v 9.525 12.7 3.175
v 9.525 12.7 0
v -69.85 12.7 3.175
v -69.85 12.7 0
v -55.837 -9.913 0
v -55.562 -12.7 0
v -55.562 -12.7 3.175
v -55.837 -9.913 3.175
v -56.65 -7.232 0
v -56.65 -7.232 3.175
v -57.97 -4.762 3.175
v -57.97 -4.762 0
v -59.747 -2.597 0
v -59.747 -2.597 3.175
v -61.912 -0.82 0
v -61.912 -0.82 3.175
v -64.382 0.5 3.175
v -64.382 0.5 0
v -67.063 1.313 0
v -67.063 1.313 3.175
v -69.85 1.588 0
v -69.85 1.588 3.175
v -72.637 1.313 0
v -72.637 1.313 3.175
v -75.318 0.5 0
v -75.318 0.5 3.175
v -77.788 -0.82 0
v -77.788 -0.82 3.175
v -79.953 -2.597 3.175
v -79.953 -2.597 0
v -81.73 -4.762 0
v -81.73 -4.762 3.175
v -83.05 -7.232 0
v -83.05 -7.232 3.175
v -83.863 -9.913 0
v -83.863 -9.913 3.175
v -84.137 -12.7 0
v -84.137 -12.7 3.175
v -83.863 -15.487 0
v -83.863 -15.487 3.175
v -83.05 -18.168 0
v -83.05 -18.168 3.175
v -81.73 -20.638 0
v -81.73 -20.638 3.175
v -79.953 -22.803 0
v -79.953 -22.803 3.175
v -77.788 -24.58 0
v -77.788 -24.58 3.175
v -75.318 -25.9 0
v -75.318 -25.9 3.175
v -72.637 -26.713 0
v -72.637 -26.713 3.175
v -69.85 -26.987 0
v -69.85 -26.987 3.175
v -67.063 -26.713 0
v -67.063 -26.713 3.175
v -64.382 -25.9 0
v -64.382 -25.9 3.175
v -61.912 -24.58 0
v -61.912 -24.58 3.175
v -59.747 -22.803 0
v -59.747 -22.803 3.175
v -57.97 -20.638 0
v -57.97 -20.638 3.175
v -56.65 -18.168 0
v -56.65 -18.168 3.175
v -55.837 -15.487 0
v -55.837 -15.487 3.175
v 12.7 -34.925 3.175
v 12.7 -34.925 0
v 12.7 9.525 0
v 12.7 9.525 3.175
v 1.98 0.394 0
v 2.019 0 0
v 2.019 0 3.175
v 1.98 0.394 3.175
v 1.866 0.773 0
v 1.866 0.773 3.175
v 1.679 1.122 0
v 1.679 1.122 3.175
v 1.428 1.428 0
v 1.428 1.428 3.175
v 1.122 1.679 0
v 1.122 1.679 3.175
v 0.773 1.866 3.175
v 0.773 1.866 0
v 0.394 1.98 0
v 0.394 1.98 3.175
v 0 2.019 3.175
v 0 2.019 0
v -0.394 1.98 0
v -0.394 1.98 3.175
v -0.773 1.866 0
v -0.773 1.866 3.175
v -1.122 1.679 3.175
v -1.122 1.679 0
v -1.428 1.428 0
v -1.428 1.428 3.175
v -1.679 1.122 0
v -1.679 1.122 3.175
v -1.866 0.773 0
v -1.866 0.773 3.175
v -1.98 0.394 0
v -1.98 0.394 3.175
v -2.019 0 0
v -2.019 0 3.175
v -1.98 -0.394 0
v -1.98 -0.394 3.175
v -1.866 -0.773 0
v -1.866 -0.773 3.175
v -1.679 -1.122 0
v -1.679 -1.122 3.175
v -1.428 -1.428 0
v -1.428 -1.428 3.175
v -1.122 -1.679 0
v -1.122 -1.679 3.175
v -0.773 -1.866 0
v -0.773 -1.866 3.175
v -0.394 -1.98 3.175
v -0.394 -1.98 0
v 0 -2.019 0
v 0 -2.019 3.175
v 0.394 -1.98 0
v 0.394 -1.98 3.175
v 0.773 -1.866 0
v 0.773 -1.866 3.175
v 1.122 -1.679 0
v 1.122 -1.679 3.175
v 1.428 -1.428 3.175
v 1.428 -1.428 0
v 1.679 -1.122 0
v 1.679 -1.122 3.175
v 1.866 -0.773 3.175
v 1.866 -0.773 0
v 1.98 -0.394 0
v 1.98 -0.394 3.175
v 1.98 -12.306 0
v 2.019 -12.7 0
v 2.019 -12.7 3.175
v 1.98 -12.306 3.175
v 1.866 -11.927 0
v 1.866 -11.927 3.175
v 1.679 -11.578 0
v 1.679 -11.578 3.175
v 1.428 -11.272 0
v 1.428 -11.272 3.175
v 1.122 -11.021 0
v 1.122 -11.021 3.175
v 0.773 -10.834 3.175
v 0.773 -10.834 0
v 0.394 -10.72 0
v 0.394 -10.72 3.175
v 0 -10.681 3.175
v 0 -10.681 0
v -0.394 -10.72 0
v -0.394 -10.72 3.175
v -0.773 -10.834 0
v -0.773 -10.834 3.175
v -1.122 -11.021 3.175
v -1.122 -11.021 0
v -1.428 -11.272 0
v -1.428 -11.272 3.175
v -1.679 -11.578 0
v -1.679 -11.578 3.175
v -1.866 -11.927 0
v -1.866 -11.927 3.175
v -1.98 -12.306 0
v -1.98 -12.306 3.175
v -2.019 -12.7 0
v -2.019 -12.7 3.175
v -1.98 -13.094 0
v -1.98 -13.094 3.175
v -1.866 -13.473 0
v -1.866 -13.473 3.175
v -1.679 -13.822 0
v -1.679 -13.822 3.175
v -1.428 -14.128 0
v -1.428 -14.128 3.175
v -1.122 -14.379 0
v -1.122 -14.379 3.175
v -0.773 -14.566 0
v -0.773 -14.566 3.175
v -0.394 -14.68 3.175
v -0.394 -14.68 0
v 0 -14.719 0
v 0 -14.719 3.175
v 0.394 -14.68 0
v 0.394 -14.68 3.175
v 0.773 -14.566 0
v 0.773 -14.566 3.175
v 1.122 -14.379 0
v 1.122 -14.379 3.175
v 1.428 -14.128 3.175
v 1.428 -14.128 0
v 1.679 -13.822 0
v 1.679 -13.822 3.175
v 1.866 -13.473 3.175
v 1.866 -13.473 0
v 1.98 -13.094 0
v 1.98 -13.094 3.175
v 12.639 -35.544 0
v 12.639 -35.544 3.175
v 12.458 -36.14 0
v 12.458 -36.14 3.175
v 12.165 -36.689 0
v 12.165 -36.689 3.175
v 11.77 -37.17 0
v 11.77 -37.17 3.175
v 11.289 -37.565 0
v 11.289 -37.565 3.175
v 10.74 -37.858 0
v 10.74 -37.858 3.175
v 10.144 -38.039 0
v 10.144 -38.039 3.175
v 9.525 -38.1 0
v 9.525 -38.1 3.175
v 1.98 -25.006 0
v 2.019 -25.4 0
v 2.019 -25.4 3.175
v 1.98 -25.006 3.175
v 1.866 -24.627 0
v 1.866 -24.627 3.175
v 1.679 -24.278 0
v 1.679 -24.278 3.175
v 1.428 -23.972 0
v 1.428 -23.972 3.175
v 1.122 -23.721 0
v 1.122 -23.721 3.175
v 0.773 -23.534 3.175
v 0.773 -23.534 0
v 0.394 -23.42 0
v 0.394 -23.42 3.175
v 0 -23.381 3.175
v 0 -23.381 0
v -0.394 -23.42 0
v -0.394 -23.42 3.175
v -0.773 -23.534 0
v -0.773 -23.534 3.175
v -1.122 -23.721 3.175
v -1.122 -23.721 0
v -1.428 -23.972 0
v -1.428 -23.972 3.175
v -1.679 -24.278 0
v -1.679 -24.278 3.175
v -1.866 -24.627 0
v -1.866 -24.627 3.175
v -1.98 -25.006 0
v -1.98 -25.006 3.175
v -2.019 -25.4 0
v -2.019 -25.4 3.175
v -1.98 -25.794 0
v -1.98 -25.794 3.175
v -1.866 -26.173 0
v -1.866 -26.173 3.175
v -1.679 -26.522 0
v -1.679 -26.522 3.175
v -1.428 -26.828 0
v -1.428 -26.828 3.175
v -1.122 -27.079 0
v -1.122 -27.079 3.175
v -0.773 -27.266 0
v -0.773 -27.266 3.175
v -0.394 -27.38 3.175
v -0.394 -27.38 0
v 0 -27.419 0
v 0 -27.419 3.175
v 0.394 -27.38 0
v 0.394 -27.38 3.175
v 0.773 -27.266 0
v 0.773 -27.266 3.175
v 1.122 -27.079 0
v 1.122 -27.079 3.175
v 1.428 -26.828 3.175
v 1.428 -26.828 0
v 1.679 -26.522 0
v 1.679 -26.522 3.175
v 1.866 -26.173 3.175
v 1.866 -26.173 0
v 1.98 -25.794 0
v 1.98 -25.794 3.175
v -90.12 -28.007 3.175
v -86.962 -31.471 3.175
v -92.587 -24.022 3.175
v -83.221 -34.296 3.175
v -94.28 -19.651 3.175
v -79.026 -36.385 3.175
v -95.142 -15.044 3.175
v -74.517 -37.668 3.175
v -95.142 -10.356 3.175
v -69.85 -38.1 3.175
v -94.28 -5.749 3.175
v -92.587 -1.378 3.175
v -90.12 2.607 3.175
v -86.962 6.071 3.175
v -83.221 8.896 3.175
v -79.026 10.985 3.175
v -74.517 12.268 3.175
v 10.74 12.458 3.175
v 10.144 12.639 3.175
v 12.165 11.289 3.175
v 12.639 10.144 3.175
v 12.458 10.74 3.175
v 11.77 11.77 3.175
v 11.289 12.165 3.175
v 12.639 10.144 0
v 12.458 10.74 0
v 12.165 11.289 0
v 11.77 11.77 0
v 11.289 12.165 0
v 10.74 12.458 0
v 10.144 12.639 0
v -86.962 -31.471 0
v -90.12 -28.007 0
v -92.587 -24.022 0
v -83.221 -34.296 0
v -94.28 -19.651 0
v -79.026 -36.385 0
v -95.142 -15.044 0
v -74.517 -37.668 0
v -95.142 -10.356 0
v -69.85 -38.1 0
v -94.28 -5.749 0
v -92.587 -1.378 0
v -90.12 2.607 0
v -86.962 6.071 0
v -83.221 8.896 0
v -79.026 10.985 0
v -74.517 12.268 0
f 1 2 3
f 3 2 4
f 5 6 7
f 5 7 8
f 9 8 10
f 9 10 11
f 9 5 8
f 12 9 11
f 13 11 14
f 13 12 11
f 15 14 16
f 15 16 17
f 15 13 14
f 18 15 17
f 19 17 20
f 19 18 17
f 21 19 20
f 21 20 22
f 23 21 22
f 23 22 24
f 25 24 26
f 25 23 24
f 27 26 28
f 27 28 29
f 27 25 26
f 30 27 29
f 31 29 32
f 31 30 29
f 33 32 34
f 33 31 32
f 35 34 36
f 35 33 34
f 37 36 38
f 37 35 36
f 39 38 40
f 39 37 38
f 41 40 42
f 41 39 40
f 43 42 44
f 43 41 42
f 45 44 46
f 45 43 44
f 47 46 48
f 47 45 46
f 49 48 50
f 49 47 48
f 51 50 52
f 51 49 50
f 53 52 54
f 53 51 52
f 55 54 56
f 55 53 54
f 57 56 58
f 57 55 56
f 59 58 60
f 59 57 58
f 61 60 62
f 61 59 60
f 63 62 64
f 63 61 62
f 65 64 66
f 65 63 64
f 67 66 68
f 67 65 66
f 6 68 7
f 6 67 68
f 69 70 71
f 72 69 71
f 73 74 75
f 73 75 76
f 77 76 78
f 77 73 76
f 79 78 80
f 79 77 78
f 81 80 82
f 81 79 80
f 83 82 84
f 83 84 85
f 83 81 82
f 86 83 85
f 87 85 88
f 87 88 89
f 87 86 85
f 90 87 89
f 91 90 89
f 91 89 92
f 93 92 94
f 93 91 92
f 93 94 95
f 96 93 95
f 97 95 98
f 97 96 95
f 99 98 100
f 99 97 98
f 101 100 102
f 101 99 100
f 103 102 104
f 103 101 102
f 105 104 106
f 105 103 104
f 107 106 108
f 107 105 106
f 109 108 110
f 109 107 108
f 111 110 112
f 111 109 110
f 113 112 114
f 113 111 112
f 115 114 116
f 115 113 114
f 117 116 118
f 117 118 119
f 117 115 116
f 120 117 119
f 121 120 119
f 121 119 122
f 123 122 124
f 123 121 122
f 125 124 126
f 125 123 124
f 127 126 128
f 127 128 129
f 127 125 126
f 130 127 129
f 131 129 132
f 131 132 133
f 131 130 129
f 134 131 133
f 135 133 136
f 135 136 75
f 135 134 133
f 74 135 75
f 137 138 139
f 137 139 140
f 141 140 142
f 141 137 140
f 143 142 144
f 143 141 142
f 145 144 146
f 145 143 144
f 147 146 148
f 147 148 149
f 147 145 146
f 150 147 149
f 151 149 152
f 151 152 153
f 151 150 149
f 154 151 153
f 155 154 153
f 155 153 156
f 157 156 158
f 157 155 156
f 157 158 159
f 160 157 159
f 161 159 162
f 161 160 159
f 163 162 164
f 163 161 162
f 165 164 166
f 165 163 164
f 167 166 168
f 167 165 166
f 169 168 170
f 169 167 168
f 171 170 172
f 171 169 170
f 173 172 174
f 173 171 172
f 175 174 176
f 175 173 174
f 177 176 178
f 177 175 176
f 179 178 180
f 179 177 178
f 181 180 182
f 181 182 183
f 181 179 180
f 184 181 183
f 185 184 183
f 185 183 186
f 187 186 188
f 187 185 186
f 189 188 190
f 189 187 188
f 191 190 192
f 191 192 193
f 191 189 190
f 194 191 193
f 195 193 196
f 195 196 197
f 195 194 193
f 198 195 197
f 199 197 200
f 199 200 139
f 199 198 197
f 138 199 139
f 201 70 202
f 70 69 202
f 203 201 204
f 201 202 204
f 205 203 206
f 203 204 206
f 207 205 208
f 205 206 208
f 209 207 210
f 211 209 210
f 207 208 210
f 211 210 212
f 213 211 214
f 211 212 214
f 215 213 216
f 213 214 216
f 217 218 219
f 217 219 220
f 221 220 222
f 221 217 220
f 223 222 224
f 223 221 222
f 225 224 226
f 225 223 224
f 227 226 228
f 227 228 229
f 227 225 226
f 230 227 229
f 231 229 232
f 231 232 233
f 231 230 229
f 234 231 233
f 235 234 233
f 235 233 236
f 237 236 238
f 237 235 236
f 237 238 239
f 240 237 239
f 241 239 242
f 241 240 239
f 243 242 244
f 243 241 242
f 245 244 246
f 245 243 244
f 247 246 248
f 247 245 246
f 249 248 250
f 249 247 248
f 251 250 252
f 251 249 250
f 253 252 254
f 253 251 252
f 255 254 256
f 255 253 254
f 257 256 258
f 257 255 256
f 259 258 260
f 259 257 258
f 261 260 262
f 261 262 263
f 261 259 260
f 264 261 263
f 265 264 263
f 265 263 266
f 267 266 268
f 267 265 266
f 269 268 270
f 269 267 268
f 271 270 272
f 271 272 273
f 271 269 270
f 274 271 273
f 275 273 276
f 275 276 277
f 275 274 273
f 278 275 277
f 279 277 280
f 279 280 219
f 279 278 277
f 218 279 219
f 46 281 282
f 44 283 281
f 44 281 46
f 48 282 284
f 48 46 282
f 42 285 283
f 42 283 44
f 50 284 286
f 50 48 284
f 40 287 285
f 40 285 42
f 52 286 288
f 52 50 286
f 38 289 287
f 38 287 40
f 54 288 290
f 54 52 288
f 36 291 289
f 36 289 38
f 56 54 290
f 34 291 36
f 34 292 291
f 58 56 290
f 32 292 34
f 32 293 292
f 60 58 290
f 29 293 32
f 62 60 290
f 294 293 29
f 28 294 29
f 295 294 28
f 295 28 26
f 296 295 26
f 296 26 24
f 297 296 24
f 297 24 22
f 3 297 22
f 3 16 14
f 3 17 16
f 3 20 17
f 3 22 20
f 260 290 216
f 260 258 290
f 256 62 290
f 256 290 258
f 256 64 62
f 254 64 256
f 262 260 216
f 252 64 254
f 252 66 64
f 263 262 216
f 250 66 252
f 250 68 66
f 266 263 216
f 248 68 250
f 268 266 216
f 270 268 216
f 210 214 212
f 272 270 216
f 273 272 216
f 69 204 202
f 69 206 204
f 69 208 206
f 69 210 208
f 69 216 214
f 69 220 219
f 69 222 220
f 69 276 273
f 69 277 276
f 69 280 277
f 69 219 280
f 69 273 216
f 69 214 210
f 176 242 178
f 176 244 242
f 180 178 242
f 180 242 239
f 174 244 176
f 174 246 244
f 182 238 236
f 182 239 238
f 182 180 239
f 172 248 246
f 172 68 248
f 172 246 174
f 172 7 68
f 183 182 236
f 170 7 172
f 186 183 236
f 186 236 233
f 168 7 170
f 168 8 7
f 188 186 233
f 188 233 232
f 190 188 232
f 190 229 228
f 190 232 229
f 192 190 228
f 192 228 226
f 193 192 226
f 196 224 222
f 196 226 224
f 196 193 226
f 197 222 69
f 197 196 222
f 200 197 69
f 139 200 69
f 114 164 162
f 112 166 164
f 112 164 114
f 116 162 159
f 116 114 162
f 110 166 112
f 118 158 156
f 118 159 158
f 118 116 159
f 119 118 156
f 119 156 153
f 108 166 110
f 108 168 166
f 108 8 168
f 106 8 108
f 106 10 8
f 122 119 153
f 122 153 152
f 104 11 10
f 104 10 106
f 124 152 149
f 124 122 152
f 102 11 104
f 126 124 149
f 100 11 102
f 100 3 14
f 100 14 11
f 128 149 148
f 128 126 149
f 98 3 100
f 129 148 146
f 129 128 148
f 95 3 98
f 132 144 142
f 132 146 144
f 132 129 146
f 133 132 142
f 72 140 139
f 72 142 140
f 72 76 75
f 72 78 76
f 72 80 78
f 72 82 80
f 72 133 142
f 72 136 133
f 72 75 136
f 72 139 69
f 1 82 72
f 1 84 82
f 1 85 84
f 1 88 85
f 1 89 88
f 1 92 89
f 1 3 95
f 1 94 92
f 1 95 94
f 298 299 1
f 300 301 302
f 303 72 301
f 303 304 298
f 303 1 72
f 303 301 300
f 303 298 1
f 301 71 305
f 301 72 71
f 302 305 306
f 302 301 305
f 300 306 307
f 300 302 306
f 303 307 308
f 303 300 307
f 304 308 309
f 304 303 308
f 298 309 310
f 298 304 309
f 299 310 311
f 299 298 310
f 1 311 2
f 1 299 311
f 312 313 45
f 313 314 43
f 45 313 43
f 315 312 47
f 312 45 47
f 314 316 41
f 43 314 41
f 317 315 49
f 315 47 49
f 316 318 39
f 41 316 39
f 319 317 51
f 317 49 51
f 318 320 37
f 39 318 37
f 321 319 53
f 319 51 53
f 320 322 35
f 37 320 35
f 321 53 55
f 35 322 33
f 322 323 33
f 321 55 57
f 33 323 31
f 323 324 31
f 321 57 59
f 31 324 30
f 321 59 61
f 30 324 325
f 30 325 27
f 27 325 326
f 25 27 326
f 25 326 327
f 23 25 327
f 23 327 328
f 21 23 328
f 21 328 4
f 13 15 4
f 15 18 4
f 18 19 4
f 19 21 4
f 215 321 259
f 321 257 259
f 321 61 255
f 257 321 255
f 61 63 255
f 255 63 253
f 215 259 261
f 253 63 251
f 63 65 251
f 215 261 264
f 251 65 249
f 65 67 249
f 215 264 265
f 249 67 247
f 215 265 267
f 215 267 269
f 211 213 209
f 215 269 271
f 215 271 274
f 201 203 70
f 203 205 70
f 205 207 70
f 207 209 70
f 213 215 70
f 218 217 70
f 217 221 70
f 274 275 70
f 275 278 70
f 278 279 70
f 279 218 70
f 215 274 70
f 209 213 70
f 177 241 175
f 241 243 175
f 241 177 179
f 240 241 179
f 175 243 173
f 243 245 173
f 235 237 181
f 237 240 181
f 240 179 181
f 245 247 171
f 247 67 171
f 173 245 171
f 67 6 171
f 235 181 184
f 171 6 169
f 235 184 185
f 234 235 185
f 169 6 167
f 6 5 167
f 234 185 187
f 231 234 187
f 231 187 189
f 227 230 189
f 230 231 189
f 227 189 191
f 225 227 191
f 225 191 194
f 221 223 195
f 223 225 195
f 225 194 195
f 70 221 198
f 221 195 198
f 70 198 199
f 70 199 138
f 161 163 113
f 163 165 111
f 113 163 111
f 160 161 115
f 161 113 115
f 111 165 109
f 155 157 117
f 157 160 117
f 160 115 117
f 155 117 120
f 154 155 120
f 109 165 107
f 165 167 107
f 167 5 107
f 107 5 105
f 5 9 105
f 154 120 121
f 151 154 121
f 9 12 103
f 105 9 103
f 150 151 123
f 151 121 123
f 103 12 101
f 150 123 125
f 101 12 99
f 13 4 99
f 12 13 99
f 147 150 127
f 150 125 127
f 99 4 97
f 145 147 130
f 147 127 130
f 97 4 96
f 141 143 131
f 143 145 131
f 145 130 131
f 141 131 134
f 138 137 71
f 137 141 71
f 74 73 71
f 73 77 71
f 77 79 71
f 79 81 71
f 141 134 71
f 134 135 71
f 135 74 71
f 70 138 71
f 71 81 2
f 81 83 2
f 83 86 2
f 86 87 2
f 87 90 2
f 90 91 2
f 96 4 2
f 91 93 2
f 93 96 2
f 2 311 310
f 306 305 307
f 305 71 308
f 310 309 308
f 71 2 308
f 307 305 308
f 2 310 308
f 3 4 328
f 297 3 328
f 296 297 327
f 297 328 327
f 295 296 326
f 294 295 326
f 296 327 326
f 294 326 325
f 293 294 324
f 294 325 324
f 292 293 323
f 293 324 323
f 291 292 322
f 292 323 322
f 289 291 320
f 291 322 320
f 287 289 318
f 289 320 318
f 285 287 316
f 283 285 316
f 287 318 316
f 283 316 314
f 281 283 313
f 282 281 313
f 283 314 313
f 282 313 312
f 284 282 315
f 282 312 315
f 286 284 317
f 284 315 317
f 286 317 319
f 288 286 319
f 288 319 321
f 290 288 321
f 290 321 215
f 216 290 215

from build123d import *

# Parameters (mm, degrees)
SKETCH1_R           = 2.0193
SKETCH1_R_2         = 14.2875
BOSS_EXTRUDE1_DEPTH = 3.175
FILLET1_R           = 3.175


with BuildPart() as part:
    # Sketch1 → Boss-Extrude1 (new body)
    with BuildSketch(Plane.XY):
        with BuildLine():
            Line((12.7, -38.1), (12.7, 12.7))
            Line((12.7, 12.7), (-69.85, 12.7))
            ThreePointArc((-69.85, 12.7), (-95.25, -12.7), (-69.85, -38.1))
            Line((-69.85, -38.1), (12.7, -38.1))
        make_face()
        Circle(SKETCH1_R, mode=Mode.SUBTRACT)
        with Locations((0, -12.7)):
            Circle(SKETCH1_R, mode=Mode.SUBTRACT)
        with Locations((0, -25.4)):
            Circle(SKETCH1_R, mode=Mode.SUBTRACT)
        with Locations((-69.85, -12.7)):
            Circle(SKETCH1_R_2, mode=Mode.SUBTRACT)
    extrude(amount=BOSS_EXTRUDE1_DEPTH)

    # Fillet1
    fillet1_edges = [part.edges().sort_by_distance(p)[0] for p in [
        (12.7, 12.7, 1.5875),
        (12.7, -38.1, 1.5875),
    ]]
    fillet(fillet1_edges, radius=FILLET1_R)


solid = part.part
